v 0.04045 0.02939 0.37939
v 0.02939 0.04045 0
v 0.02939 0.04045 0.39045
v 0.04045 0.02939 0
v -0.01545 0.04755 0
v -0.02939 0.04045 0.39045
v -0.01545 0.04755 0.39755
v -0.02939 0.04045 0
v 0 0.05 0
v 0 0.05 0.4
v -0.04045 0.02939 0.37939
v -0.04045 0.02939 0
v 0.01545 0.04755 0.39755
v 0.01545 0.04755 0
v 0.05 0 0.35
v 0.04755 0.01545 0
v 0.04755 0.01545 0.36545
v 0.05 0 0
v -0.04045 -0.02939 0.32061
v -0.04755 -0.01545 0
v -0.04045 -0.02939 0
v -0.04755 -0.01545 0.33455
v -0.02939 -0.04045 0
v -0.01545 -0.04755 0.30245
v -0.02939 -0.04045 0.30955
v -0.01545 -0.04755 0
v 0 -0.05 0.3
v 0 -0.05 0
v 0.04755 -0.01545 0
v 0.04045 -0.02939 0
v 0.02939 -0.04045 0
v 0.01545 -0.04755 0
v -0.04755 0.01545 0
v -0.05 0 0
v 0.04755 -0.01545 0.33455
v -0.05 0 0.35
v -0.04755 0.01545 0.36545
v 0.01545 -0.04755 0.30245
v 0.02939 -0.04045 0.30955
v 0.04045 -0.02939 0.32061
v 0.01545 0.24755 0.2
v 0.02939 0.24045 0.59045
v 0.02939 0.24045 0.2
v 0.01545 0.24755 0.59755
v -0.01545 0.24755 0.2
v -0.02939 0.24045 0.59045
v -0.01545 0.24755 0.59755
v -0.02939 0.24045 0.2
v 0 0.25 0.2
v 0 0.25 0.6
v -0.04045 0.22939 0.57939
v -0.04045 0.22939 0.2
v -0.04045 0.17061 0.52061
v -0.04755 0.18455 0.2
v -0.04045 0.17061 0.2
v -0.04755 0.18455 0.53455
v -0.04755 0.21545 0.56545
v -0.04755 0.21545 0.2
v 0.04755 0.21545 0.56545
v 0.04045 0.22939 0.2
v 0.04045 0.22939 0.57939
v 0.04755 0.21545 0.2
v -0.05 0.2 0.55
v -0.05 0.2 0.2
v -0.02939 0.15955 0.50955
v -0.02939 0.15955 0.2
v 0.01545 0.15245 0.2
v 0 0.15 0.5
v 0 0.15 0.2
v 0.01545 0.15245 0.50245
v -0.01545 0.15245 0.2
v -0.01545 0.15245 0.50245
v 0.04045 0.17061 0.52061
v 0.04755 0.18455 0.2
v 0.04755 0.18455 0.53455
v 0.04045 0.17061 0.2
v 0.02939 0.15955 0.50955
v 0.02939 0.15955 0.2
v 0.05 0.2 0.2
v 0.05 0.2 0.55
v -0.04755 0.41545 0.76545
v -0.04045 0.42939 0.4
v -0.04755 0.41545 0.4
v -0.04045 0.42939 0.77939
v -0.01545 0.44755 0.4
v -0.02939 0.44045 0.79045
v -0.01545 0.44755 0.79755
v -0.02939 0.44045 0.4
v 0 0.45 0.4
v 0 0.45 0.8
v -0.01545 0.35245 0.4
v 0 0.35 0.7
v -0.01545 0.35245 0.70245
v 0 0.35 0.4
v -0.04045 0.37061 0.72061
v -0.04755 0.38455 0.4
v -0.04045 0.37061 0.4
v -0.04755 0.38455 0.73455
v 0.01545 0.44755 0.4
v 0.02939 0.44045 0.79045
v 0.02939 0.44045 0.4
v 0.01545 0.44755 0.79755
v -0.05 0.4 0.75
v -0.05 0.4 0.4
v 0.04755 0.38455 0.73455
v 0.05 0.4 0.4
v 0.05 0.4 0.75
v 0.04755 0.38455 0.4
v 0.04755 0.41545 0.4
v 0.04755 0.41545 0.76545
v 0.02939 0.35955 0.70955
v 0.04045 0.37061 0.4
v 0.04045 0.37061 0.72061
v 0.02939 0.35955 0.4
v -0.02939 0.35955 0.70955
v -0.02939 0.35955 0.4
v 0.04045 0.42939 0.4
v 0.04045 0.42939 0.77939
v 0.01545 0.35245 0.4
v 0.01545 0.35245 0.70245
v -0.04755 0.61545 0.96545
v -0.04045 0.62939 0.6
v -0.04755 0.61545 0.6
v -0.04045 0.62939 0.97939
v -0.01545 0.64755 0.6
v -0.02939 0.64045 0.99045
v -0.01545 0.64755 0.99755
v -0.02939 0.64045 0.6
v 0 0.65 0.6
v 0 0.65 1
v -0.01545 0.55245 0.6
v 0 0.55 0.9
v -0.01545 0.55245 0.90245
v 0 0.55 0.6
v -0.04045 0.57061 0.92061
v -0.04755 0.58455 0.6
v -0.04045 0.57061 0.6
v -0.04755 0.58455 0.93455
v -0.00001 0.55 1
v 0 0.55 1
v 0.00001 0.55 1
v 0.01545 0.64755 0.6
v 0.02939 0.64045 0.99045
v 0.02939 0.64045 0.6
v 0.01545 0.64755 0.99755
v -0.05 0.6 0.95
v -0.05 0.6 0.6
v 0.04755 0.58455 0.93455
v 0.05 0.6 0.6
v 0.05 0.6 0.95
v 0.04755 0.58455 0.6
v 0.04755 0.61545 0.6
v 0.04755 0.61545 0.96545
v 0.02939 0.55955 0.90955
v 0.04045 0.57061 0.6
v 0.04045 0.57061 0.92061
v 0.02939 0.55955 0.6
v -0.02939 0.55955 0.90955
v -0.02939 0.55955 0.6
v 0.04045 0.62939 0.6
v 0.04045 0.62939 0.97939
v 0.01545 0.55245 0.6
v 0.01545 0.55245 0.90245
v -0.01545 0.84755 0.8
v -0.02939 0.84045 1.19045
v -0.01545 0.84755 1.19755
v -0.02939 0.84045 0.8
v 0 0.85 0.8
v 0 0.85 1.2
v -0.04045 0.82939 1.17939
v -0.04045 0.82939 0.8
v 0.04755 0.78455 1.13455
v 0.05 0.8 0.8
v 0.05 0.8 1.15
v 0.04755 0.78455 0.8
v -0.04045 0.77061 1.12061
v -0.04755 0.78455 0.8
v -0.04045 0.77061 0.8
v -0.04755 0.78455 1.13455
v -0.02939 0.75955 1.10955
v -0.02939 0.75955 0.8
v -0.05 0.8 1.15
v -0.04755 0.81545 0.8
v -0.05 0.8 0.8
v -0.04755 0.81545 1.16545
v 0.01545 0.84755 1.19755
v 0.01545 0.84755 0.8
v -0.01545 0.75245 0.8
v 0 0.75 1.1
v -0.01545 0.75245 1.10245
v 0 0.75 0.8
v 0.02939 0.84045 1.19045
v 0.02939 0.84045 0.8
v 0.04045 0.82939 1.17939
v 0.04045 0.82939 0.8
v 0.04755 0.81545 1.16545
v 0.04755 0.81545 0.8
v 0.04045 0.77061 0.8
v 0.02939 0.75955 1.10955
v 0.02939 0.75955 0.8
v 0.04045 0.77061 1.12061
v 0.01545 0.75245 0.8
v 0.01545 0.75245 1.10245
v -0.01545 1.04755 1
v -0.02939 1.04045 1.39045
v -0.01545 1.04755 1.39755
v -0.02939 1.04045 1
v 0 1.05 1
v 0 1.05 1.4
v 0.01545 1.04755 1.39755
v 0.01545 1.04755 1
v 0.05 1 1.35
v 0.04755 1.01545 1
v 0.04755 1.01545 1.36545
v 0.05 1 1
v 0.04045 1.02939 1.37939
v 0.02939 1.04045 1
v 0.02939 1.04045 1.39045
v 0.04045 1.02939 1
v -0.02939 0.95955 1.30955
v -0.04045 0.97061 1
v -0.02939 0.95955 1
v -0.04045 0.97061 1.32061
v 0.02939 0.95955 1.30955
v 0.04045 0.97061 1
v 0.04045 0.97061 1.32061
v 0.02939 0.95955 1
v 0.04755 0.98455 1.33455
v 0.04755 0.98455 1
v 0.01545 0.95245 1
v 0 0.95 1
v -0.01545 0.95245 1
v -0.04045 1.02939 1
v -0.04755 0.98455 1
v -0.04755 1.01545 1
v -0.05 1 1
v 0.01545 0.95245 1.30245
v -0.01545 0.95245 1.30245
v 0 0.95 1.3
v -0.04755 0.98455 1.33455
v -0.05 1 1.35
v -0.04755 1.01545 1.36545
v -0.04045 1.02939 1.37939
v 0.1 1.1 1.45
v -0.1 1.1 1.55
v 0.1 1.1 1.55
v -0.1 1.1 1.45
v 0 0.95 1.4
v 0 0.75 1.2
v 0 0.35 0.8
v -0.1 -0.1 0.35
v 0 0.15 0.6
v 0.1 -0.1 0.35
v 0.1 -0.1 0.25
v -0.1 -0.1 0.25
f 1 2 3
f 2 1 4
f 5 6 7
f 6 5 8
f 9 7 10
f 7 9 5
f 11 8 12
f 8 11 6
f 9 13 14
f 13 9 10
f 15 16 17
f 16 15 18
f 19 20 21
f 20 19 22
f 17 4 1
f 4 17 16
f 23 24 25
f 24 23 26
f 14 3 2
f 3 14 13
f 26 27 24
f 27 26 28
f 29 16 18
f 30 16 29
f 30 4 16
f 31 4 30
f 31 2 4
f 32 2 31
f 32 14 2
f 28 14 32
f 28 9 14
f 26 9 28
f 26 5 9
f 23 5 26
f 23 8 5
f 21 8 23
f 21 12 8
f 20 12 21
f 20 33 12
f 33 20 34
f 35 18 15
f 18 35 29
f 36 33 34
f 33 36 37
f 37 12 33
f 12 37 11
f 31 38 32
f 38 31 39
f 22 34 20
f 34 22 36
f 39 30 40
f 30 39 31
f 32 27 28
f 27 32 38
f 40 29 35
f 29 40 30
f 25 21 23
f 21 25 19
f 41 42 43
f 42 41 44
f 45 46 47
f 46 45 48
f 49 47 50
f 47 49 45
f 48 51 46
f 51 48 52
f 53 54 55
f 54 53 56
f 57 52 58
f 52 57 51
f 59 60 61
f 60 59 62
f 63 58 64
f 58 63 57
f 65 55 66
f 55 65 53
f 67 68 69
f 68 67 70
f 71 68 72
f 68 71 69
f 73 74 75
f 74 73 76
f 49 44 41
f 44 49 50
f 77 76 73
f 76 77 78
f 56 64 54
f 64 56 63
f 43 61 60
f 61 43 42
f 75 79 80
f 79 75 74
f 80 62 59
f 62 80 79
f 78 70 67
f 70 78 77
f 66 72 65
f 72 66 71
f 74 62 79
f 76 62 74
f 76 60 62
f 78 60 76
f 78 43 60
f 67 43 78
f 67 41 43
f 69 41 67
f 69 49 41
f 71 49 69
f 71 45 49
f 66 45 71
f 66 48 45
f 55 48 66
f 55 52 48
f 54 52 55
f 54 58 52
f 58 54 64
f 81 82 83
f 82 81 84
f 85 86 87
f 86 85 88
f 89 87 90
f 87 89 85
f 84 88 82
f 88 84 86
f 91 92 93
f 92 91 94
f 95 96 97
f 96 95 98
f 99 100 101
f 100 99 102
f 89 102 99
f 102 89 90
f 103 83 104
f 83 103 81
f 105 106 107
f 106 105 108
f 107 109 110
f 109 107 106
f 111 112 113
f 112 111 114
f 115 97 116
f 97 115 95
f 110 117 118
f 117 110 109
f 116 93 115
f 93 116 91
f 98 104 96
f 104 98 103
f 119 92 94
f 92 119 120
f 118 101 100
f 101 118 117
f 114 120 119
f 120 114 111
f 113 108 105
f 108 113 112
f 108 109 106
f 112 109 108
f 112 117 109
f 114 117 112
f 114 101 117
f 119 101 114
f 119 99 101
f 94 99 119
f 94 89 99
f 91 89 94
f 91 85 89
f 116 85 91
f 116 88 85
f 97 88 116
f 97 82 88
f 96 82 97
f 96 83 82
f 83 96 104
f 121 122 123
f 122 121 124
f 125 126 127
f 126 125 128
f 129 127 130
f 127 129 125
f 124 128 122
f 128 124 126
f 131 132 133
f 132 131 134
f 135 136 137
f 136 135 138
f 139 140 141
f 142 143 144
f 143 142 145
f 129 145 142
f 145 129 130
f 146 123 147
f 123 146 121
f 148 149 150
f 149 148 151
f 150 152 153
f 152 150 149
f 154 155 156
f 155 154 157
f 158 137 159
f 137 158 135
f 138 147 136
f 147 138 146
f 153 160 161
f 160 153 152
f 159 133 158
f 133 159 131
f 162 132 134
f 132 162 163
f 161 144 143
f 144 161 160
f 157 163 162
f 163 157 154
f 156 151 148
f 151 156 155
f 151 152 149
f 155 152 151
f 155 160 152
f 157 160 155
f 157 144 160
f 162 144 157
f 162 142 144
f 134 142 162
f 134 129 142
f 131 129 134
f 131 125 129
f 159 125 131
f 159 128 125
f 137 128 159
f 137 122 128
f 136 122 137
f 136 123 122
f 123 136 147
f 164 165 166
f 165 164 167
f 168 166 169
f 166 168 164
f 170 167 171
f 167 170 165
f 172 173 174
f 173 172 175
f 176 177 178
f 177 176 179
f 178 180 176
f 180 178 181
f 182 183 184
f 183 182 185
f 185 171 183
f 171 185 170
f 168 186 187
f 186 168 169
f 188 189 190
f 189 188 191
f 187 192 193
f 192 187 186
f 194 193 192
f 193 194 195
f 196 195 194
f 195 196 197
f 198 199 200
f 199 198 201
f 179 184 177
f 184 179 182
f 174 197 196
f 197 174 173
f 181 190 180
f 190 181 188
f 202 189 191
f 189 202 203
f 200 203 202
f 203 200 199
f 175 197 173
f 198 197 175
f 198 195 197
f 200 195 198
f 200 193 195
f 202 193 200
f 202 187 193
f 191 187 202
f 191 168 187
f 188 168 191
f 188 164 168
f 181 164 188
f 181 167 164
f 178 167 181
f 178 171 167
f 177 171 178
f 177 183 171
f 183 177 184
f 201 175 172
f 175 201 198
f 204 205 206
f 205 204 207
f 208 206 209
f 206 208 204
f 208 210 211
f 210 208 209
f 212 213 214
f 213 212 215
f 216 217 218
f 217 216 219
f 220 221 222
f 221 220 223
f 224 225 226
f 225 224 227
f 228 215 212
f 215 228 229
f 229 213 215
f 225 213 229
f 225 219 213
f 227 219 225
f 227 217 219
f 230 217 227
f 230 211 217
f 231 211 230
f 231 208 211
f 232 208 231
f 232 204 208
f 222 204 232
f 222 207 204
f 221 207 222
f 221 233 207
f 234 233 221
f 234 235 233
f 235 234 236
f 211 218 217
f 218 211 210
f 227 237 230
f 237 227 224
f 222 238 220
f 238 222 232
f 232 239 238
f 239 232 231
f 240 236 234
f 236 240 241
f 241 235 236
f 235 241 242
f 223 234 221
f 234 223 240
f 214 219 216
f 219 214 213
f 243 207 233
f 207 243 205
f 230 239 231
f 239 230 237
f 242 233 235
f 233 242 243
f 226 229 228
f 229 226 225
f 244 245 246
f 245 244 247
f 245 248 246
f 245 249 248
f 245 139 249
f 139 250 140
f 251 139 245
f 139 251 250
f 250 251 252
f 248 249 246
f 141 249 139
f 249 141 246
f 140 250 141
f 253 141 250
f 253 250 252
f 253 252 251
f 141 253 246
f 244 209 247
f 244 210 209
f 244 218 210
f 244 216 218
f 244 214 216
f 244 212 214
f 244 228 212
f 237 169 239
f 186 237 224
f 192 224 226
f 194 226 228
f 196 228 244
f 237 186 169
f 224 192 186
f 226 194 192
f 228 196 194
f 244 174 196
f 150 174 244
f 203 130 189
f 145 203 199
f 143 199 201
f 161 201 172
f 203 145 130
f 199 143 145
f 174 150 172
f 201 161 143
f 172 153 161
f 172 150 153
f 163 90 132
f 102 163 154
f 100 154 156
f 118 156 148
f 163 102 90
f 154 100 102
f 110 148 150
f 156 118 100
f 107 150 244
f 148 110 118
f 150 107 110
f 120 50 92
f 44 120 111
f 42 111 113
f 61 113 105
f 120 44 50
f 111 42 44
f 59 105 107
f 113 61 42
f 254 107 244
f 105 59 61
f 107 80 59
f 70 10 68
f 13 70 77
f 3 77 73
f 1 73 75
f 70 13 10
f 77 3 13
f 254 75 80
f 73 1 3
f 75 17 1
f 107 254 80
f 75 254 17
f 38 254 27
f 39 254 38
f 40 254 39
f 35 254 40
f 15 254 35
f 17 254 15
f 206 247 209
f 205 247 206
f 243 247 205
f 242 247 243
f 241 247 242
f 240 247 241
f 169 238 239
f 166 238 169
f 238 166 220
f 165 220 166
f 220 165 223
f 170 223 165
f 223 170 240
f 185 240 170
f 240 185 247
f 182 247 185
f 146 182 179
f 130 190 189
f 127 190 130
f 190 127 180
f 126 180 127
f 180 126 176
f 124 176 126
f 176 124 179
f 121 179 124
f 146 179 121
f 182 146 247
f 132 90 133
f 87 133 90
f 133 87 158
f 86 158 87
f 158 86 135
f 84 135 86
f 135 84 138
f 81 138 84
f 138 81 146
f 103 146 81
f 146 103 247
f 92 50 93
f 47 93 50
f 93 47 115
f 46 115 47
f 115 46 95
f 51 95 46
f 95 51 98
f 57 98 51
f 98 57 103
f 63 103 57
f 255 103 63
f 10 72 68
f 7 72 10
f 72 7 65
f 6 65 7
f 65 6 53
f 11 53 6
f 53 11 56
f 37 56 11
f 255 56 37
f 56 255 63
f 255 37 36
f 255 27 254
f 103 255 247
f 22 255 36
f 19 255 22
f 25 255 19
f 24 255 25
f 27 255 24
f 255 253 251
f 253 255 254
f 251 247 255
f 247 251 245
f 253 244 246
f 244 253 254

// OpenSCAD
length=1;
height=.4;
post_radius=0.05;
rail_radius=0.03;
skew = [ [ 1  , 0  , 0  , 0   ],
         [ 0  , 1  , 0  , 0   ],
         [ 1  , 0  , 1  , 0   ],
         [ 0  , 0  , 0  , 1   ] ] ;

rotate([0,0,90]) // This is in *room* position, because it's attached to the stairs rule.
union() {
    // Posts
    for (i = [0:0.2:1]) {
        translate([i * length, 0, i * length]) {
            cylinder(h = height, r = post_radius, $fn = 20);
        }
    }

    translate([-.1, -.1, height-.15])
    multmatrix(skew)
    cube([1.2, .2, .1]);
}
